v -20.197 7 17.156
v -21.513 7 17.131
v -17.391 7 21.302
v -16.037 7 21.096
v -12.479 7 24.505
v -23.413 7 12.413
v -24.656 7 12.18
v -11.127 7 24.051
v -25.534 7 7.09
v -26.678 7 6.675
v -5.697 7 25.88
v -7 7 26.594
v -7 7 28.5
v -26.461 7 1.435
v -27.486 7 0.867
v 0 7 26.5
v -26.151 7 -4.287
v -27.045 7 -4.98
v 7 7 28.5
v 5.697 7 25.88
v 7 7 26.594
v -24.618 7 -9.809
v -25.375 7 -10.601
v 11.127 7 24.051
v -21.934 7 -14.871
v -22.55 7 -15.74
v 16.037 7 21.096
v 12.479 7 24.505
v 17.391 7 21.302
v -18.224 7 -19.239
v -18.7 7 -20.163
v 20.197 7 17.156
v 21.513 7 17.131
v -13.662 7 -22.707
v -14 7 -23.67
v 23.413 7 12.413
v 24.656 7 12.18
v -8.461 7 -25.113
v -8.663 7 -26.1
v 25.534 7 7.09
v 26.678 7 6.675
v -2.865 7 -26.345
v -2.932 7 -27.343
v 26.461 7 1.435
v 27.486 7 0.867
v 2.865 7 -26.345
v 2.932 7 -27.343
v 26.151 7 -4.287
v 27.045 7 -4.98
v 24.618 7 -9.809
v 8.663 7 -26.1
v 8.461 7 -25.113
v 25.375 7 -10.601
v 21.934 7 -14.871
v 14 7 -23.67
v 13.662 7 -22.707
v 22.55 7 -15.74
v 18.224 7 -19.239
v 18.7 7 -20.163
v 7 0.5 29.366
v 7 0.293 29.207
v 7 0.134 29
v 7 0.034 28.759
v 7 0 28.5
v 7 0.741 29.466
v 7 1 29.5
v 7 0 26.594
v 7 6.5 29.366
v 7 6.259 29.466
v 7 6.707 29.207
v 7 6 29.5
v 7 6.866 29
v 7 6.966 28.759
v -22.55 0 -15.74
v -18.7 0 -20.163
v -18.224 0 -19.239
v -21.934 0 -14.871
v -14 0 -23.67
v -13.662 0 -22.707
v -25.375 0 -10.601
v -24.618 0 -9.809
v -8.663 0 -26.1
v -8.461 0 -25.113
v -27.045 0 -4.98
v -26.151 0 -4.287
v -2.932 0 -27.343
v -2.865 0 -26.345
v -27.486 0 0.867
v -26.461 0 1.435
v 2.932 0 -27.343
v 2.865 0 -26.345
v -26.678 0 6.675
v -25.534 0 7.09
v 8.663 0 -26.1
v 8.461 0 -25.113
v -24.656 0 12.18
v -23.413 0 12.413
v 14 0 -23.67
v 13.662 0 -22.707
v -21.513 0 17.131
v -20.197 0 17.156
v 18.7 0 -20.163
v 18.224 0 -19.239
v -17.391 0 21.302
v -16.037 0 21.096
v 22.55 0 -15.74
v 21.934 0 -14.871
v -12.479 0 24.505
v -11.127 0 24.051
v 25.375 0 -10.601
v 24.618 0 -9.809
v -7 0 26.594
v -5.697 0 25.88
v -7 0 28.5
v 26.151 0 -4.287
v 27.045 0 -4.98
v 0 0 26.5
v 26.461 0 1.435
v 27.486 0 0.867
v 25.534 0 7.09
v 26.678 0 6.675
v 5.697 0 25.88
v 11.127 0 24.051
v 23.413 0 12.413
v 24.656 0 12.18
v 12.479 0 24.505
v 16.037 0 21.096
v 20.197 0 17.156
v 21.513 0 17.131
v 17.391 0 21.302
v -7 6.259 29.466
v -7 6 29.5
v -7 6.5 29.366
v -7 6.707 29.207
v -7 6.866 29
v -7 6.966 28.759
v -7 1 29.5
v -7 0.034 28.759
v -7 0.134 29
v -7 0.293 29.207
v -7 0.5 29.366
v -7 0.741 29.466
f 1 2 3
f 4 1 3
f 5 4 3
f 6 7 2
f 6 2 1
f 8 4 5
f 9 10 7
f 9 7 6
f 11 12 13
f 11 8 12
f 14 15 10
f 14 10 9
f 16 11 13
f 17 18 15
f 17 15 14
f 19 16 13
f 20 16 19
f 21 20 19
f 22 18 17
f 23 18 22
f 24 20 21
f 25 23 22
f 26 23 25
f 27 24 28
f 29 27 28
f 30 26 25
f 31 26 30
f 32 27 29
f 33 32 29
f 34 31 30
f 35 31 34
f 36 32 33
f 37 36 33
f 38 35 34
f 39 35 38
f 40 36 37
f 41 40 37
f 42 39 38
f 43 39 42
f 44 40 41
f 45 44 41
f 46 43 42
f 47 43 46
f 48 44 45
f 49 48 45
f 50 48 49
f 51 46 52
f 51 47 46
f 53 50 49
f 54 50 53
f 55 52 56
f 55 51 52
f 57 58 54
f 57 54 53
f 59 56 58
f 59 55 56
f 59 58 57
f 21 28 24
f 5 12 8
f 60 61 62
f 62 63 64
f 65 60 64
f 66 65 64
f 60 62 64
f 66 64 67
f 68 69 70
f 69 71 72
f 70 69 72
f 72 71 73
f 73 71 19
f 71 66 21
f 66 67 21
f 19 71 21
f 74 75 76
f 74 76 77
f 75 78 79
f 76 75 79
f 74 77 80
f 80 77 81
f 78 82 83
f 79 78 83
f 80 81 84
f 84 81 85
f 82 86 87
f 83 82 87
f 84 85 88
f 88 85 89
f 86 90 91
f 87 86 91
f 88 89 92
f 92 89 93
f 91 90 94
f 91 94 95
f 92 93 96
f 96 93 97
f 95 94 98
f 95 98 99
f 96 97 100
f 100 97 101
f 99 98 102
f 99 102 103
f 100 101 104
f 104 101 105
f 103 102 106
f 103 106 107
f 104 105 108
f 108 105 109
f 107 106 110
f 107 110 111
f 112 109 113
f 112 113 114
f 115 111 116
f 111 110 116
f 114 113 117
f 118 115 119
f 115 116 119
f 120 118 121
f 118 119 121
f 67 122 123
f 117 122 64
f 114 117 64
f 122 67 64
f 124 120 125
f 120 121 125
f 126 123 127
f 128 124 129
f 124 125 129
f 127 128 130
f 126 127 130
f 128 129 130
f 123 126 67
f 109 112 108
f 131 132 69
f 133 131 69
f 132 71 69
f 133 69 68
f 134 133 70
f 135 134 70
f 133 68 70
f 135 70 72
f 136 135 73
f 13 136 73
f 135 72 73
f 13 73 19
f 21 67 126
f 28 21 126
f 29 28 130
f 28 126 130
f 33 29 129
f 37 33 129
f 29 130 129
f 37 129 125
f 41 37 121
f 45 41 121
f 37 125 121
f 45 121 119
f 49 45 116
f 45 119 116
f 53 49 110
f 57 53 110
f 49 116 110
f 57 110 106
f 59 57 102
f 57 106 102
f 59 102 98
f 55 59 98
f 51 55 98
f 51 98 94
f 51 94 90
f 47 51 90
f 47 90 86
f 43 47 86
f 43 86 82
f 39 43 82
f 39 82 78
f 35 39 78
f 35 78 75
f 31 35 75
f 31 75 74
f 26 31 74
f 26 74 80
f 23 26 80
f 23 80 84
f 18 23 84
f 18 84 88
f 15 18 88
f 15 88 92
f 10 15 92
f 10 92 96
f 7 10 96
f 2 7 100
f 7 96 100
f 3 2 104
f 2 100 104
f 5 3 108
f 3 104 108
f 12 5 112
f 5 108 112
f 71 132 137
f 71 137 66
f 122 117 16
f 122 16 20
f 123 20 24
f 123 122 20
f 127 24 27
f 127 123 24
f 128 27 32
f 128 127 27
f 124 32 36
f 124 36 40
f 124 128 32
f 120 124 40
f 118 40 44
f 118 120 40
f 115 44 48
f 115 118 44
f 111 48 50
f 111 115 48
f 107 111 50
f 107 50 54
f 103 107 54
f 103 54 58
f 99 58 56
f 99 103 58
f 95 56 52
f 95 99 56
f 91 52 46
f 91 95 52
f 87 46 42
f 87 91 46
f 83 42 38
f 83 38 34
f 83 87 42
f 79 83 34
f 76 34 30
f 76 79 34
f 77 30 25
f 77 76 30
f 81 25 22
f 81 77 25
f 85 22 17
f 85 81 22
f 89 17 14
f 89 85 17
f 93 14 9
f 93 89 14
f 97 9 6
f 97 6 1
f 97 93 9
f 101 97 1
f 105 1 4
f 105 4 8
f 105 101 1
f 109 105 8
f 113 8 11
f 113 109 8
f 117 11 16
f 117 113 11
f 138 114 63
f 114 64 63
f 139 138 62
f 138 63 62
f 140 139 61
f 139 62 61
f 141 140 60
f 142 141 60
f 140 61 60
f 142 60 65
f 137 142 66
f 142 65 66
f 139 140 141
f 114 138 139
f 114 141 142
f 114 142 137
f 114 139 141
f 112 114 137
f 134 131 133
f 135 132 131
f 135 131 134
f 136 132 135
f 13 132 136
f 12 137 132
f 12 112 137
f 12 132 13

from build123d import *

# Parameters (mm, degrees)
SKETCH1_R           = 27.5
SKETCH1_R_2         = 26.5
BOSS_EXTRUDE1_DEPTH = 7
SKETCH2_W           = 14
SKETCH2_H           = 7
BOSS_EXTRUDE2_DEPTH = 3
FILLET1_R           = 1


with BuildPart() as part:
    # Sketch1 → Boss-Extrude1 (new body)
    with BuildSketch(Plane(origin=(0, 0, 0), x_dir=(1, 0, 0), z_dir=(0, 1, 0))):
        with Locations(Location((0, 0, 0), (0, 0, 270))):
            Circle(SKETCH1_R)
        with Locations(Location((0, 0, 0), (0, 0, 270))):
            Circle(SKETCH1_R_2, mode=Mode.SUBTRACT)
    extrude(amount=BOSS_EXTRUDE1_DEPTH)

    # Sketch2 → Boss-Extrude2 (add)
    with BuildSketch(Plane.XY.offset(26.5)):
        with Locations((0, 3.5)):
            Rectangle(SKETCH2_W, SKETCH2_H)
    extrude(amount=BOSS_EXTRUDE2_DEPTH)

    # Fillet1
    fillet1_edges = [part.edges().sort_by_distance(p)[0] for p in [
        (0, 0, 29.5),
        (0, 7, 29.5),
    ]]
    fillet(fillet1_edges, radius=FILLET1_R)


solid = part.part
